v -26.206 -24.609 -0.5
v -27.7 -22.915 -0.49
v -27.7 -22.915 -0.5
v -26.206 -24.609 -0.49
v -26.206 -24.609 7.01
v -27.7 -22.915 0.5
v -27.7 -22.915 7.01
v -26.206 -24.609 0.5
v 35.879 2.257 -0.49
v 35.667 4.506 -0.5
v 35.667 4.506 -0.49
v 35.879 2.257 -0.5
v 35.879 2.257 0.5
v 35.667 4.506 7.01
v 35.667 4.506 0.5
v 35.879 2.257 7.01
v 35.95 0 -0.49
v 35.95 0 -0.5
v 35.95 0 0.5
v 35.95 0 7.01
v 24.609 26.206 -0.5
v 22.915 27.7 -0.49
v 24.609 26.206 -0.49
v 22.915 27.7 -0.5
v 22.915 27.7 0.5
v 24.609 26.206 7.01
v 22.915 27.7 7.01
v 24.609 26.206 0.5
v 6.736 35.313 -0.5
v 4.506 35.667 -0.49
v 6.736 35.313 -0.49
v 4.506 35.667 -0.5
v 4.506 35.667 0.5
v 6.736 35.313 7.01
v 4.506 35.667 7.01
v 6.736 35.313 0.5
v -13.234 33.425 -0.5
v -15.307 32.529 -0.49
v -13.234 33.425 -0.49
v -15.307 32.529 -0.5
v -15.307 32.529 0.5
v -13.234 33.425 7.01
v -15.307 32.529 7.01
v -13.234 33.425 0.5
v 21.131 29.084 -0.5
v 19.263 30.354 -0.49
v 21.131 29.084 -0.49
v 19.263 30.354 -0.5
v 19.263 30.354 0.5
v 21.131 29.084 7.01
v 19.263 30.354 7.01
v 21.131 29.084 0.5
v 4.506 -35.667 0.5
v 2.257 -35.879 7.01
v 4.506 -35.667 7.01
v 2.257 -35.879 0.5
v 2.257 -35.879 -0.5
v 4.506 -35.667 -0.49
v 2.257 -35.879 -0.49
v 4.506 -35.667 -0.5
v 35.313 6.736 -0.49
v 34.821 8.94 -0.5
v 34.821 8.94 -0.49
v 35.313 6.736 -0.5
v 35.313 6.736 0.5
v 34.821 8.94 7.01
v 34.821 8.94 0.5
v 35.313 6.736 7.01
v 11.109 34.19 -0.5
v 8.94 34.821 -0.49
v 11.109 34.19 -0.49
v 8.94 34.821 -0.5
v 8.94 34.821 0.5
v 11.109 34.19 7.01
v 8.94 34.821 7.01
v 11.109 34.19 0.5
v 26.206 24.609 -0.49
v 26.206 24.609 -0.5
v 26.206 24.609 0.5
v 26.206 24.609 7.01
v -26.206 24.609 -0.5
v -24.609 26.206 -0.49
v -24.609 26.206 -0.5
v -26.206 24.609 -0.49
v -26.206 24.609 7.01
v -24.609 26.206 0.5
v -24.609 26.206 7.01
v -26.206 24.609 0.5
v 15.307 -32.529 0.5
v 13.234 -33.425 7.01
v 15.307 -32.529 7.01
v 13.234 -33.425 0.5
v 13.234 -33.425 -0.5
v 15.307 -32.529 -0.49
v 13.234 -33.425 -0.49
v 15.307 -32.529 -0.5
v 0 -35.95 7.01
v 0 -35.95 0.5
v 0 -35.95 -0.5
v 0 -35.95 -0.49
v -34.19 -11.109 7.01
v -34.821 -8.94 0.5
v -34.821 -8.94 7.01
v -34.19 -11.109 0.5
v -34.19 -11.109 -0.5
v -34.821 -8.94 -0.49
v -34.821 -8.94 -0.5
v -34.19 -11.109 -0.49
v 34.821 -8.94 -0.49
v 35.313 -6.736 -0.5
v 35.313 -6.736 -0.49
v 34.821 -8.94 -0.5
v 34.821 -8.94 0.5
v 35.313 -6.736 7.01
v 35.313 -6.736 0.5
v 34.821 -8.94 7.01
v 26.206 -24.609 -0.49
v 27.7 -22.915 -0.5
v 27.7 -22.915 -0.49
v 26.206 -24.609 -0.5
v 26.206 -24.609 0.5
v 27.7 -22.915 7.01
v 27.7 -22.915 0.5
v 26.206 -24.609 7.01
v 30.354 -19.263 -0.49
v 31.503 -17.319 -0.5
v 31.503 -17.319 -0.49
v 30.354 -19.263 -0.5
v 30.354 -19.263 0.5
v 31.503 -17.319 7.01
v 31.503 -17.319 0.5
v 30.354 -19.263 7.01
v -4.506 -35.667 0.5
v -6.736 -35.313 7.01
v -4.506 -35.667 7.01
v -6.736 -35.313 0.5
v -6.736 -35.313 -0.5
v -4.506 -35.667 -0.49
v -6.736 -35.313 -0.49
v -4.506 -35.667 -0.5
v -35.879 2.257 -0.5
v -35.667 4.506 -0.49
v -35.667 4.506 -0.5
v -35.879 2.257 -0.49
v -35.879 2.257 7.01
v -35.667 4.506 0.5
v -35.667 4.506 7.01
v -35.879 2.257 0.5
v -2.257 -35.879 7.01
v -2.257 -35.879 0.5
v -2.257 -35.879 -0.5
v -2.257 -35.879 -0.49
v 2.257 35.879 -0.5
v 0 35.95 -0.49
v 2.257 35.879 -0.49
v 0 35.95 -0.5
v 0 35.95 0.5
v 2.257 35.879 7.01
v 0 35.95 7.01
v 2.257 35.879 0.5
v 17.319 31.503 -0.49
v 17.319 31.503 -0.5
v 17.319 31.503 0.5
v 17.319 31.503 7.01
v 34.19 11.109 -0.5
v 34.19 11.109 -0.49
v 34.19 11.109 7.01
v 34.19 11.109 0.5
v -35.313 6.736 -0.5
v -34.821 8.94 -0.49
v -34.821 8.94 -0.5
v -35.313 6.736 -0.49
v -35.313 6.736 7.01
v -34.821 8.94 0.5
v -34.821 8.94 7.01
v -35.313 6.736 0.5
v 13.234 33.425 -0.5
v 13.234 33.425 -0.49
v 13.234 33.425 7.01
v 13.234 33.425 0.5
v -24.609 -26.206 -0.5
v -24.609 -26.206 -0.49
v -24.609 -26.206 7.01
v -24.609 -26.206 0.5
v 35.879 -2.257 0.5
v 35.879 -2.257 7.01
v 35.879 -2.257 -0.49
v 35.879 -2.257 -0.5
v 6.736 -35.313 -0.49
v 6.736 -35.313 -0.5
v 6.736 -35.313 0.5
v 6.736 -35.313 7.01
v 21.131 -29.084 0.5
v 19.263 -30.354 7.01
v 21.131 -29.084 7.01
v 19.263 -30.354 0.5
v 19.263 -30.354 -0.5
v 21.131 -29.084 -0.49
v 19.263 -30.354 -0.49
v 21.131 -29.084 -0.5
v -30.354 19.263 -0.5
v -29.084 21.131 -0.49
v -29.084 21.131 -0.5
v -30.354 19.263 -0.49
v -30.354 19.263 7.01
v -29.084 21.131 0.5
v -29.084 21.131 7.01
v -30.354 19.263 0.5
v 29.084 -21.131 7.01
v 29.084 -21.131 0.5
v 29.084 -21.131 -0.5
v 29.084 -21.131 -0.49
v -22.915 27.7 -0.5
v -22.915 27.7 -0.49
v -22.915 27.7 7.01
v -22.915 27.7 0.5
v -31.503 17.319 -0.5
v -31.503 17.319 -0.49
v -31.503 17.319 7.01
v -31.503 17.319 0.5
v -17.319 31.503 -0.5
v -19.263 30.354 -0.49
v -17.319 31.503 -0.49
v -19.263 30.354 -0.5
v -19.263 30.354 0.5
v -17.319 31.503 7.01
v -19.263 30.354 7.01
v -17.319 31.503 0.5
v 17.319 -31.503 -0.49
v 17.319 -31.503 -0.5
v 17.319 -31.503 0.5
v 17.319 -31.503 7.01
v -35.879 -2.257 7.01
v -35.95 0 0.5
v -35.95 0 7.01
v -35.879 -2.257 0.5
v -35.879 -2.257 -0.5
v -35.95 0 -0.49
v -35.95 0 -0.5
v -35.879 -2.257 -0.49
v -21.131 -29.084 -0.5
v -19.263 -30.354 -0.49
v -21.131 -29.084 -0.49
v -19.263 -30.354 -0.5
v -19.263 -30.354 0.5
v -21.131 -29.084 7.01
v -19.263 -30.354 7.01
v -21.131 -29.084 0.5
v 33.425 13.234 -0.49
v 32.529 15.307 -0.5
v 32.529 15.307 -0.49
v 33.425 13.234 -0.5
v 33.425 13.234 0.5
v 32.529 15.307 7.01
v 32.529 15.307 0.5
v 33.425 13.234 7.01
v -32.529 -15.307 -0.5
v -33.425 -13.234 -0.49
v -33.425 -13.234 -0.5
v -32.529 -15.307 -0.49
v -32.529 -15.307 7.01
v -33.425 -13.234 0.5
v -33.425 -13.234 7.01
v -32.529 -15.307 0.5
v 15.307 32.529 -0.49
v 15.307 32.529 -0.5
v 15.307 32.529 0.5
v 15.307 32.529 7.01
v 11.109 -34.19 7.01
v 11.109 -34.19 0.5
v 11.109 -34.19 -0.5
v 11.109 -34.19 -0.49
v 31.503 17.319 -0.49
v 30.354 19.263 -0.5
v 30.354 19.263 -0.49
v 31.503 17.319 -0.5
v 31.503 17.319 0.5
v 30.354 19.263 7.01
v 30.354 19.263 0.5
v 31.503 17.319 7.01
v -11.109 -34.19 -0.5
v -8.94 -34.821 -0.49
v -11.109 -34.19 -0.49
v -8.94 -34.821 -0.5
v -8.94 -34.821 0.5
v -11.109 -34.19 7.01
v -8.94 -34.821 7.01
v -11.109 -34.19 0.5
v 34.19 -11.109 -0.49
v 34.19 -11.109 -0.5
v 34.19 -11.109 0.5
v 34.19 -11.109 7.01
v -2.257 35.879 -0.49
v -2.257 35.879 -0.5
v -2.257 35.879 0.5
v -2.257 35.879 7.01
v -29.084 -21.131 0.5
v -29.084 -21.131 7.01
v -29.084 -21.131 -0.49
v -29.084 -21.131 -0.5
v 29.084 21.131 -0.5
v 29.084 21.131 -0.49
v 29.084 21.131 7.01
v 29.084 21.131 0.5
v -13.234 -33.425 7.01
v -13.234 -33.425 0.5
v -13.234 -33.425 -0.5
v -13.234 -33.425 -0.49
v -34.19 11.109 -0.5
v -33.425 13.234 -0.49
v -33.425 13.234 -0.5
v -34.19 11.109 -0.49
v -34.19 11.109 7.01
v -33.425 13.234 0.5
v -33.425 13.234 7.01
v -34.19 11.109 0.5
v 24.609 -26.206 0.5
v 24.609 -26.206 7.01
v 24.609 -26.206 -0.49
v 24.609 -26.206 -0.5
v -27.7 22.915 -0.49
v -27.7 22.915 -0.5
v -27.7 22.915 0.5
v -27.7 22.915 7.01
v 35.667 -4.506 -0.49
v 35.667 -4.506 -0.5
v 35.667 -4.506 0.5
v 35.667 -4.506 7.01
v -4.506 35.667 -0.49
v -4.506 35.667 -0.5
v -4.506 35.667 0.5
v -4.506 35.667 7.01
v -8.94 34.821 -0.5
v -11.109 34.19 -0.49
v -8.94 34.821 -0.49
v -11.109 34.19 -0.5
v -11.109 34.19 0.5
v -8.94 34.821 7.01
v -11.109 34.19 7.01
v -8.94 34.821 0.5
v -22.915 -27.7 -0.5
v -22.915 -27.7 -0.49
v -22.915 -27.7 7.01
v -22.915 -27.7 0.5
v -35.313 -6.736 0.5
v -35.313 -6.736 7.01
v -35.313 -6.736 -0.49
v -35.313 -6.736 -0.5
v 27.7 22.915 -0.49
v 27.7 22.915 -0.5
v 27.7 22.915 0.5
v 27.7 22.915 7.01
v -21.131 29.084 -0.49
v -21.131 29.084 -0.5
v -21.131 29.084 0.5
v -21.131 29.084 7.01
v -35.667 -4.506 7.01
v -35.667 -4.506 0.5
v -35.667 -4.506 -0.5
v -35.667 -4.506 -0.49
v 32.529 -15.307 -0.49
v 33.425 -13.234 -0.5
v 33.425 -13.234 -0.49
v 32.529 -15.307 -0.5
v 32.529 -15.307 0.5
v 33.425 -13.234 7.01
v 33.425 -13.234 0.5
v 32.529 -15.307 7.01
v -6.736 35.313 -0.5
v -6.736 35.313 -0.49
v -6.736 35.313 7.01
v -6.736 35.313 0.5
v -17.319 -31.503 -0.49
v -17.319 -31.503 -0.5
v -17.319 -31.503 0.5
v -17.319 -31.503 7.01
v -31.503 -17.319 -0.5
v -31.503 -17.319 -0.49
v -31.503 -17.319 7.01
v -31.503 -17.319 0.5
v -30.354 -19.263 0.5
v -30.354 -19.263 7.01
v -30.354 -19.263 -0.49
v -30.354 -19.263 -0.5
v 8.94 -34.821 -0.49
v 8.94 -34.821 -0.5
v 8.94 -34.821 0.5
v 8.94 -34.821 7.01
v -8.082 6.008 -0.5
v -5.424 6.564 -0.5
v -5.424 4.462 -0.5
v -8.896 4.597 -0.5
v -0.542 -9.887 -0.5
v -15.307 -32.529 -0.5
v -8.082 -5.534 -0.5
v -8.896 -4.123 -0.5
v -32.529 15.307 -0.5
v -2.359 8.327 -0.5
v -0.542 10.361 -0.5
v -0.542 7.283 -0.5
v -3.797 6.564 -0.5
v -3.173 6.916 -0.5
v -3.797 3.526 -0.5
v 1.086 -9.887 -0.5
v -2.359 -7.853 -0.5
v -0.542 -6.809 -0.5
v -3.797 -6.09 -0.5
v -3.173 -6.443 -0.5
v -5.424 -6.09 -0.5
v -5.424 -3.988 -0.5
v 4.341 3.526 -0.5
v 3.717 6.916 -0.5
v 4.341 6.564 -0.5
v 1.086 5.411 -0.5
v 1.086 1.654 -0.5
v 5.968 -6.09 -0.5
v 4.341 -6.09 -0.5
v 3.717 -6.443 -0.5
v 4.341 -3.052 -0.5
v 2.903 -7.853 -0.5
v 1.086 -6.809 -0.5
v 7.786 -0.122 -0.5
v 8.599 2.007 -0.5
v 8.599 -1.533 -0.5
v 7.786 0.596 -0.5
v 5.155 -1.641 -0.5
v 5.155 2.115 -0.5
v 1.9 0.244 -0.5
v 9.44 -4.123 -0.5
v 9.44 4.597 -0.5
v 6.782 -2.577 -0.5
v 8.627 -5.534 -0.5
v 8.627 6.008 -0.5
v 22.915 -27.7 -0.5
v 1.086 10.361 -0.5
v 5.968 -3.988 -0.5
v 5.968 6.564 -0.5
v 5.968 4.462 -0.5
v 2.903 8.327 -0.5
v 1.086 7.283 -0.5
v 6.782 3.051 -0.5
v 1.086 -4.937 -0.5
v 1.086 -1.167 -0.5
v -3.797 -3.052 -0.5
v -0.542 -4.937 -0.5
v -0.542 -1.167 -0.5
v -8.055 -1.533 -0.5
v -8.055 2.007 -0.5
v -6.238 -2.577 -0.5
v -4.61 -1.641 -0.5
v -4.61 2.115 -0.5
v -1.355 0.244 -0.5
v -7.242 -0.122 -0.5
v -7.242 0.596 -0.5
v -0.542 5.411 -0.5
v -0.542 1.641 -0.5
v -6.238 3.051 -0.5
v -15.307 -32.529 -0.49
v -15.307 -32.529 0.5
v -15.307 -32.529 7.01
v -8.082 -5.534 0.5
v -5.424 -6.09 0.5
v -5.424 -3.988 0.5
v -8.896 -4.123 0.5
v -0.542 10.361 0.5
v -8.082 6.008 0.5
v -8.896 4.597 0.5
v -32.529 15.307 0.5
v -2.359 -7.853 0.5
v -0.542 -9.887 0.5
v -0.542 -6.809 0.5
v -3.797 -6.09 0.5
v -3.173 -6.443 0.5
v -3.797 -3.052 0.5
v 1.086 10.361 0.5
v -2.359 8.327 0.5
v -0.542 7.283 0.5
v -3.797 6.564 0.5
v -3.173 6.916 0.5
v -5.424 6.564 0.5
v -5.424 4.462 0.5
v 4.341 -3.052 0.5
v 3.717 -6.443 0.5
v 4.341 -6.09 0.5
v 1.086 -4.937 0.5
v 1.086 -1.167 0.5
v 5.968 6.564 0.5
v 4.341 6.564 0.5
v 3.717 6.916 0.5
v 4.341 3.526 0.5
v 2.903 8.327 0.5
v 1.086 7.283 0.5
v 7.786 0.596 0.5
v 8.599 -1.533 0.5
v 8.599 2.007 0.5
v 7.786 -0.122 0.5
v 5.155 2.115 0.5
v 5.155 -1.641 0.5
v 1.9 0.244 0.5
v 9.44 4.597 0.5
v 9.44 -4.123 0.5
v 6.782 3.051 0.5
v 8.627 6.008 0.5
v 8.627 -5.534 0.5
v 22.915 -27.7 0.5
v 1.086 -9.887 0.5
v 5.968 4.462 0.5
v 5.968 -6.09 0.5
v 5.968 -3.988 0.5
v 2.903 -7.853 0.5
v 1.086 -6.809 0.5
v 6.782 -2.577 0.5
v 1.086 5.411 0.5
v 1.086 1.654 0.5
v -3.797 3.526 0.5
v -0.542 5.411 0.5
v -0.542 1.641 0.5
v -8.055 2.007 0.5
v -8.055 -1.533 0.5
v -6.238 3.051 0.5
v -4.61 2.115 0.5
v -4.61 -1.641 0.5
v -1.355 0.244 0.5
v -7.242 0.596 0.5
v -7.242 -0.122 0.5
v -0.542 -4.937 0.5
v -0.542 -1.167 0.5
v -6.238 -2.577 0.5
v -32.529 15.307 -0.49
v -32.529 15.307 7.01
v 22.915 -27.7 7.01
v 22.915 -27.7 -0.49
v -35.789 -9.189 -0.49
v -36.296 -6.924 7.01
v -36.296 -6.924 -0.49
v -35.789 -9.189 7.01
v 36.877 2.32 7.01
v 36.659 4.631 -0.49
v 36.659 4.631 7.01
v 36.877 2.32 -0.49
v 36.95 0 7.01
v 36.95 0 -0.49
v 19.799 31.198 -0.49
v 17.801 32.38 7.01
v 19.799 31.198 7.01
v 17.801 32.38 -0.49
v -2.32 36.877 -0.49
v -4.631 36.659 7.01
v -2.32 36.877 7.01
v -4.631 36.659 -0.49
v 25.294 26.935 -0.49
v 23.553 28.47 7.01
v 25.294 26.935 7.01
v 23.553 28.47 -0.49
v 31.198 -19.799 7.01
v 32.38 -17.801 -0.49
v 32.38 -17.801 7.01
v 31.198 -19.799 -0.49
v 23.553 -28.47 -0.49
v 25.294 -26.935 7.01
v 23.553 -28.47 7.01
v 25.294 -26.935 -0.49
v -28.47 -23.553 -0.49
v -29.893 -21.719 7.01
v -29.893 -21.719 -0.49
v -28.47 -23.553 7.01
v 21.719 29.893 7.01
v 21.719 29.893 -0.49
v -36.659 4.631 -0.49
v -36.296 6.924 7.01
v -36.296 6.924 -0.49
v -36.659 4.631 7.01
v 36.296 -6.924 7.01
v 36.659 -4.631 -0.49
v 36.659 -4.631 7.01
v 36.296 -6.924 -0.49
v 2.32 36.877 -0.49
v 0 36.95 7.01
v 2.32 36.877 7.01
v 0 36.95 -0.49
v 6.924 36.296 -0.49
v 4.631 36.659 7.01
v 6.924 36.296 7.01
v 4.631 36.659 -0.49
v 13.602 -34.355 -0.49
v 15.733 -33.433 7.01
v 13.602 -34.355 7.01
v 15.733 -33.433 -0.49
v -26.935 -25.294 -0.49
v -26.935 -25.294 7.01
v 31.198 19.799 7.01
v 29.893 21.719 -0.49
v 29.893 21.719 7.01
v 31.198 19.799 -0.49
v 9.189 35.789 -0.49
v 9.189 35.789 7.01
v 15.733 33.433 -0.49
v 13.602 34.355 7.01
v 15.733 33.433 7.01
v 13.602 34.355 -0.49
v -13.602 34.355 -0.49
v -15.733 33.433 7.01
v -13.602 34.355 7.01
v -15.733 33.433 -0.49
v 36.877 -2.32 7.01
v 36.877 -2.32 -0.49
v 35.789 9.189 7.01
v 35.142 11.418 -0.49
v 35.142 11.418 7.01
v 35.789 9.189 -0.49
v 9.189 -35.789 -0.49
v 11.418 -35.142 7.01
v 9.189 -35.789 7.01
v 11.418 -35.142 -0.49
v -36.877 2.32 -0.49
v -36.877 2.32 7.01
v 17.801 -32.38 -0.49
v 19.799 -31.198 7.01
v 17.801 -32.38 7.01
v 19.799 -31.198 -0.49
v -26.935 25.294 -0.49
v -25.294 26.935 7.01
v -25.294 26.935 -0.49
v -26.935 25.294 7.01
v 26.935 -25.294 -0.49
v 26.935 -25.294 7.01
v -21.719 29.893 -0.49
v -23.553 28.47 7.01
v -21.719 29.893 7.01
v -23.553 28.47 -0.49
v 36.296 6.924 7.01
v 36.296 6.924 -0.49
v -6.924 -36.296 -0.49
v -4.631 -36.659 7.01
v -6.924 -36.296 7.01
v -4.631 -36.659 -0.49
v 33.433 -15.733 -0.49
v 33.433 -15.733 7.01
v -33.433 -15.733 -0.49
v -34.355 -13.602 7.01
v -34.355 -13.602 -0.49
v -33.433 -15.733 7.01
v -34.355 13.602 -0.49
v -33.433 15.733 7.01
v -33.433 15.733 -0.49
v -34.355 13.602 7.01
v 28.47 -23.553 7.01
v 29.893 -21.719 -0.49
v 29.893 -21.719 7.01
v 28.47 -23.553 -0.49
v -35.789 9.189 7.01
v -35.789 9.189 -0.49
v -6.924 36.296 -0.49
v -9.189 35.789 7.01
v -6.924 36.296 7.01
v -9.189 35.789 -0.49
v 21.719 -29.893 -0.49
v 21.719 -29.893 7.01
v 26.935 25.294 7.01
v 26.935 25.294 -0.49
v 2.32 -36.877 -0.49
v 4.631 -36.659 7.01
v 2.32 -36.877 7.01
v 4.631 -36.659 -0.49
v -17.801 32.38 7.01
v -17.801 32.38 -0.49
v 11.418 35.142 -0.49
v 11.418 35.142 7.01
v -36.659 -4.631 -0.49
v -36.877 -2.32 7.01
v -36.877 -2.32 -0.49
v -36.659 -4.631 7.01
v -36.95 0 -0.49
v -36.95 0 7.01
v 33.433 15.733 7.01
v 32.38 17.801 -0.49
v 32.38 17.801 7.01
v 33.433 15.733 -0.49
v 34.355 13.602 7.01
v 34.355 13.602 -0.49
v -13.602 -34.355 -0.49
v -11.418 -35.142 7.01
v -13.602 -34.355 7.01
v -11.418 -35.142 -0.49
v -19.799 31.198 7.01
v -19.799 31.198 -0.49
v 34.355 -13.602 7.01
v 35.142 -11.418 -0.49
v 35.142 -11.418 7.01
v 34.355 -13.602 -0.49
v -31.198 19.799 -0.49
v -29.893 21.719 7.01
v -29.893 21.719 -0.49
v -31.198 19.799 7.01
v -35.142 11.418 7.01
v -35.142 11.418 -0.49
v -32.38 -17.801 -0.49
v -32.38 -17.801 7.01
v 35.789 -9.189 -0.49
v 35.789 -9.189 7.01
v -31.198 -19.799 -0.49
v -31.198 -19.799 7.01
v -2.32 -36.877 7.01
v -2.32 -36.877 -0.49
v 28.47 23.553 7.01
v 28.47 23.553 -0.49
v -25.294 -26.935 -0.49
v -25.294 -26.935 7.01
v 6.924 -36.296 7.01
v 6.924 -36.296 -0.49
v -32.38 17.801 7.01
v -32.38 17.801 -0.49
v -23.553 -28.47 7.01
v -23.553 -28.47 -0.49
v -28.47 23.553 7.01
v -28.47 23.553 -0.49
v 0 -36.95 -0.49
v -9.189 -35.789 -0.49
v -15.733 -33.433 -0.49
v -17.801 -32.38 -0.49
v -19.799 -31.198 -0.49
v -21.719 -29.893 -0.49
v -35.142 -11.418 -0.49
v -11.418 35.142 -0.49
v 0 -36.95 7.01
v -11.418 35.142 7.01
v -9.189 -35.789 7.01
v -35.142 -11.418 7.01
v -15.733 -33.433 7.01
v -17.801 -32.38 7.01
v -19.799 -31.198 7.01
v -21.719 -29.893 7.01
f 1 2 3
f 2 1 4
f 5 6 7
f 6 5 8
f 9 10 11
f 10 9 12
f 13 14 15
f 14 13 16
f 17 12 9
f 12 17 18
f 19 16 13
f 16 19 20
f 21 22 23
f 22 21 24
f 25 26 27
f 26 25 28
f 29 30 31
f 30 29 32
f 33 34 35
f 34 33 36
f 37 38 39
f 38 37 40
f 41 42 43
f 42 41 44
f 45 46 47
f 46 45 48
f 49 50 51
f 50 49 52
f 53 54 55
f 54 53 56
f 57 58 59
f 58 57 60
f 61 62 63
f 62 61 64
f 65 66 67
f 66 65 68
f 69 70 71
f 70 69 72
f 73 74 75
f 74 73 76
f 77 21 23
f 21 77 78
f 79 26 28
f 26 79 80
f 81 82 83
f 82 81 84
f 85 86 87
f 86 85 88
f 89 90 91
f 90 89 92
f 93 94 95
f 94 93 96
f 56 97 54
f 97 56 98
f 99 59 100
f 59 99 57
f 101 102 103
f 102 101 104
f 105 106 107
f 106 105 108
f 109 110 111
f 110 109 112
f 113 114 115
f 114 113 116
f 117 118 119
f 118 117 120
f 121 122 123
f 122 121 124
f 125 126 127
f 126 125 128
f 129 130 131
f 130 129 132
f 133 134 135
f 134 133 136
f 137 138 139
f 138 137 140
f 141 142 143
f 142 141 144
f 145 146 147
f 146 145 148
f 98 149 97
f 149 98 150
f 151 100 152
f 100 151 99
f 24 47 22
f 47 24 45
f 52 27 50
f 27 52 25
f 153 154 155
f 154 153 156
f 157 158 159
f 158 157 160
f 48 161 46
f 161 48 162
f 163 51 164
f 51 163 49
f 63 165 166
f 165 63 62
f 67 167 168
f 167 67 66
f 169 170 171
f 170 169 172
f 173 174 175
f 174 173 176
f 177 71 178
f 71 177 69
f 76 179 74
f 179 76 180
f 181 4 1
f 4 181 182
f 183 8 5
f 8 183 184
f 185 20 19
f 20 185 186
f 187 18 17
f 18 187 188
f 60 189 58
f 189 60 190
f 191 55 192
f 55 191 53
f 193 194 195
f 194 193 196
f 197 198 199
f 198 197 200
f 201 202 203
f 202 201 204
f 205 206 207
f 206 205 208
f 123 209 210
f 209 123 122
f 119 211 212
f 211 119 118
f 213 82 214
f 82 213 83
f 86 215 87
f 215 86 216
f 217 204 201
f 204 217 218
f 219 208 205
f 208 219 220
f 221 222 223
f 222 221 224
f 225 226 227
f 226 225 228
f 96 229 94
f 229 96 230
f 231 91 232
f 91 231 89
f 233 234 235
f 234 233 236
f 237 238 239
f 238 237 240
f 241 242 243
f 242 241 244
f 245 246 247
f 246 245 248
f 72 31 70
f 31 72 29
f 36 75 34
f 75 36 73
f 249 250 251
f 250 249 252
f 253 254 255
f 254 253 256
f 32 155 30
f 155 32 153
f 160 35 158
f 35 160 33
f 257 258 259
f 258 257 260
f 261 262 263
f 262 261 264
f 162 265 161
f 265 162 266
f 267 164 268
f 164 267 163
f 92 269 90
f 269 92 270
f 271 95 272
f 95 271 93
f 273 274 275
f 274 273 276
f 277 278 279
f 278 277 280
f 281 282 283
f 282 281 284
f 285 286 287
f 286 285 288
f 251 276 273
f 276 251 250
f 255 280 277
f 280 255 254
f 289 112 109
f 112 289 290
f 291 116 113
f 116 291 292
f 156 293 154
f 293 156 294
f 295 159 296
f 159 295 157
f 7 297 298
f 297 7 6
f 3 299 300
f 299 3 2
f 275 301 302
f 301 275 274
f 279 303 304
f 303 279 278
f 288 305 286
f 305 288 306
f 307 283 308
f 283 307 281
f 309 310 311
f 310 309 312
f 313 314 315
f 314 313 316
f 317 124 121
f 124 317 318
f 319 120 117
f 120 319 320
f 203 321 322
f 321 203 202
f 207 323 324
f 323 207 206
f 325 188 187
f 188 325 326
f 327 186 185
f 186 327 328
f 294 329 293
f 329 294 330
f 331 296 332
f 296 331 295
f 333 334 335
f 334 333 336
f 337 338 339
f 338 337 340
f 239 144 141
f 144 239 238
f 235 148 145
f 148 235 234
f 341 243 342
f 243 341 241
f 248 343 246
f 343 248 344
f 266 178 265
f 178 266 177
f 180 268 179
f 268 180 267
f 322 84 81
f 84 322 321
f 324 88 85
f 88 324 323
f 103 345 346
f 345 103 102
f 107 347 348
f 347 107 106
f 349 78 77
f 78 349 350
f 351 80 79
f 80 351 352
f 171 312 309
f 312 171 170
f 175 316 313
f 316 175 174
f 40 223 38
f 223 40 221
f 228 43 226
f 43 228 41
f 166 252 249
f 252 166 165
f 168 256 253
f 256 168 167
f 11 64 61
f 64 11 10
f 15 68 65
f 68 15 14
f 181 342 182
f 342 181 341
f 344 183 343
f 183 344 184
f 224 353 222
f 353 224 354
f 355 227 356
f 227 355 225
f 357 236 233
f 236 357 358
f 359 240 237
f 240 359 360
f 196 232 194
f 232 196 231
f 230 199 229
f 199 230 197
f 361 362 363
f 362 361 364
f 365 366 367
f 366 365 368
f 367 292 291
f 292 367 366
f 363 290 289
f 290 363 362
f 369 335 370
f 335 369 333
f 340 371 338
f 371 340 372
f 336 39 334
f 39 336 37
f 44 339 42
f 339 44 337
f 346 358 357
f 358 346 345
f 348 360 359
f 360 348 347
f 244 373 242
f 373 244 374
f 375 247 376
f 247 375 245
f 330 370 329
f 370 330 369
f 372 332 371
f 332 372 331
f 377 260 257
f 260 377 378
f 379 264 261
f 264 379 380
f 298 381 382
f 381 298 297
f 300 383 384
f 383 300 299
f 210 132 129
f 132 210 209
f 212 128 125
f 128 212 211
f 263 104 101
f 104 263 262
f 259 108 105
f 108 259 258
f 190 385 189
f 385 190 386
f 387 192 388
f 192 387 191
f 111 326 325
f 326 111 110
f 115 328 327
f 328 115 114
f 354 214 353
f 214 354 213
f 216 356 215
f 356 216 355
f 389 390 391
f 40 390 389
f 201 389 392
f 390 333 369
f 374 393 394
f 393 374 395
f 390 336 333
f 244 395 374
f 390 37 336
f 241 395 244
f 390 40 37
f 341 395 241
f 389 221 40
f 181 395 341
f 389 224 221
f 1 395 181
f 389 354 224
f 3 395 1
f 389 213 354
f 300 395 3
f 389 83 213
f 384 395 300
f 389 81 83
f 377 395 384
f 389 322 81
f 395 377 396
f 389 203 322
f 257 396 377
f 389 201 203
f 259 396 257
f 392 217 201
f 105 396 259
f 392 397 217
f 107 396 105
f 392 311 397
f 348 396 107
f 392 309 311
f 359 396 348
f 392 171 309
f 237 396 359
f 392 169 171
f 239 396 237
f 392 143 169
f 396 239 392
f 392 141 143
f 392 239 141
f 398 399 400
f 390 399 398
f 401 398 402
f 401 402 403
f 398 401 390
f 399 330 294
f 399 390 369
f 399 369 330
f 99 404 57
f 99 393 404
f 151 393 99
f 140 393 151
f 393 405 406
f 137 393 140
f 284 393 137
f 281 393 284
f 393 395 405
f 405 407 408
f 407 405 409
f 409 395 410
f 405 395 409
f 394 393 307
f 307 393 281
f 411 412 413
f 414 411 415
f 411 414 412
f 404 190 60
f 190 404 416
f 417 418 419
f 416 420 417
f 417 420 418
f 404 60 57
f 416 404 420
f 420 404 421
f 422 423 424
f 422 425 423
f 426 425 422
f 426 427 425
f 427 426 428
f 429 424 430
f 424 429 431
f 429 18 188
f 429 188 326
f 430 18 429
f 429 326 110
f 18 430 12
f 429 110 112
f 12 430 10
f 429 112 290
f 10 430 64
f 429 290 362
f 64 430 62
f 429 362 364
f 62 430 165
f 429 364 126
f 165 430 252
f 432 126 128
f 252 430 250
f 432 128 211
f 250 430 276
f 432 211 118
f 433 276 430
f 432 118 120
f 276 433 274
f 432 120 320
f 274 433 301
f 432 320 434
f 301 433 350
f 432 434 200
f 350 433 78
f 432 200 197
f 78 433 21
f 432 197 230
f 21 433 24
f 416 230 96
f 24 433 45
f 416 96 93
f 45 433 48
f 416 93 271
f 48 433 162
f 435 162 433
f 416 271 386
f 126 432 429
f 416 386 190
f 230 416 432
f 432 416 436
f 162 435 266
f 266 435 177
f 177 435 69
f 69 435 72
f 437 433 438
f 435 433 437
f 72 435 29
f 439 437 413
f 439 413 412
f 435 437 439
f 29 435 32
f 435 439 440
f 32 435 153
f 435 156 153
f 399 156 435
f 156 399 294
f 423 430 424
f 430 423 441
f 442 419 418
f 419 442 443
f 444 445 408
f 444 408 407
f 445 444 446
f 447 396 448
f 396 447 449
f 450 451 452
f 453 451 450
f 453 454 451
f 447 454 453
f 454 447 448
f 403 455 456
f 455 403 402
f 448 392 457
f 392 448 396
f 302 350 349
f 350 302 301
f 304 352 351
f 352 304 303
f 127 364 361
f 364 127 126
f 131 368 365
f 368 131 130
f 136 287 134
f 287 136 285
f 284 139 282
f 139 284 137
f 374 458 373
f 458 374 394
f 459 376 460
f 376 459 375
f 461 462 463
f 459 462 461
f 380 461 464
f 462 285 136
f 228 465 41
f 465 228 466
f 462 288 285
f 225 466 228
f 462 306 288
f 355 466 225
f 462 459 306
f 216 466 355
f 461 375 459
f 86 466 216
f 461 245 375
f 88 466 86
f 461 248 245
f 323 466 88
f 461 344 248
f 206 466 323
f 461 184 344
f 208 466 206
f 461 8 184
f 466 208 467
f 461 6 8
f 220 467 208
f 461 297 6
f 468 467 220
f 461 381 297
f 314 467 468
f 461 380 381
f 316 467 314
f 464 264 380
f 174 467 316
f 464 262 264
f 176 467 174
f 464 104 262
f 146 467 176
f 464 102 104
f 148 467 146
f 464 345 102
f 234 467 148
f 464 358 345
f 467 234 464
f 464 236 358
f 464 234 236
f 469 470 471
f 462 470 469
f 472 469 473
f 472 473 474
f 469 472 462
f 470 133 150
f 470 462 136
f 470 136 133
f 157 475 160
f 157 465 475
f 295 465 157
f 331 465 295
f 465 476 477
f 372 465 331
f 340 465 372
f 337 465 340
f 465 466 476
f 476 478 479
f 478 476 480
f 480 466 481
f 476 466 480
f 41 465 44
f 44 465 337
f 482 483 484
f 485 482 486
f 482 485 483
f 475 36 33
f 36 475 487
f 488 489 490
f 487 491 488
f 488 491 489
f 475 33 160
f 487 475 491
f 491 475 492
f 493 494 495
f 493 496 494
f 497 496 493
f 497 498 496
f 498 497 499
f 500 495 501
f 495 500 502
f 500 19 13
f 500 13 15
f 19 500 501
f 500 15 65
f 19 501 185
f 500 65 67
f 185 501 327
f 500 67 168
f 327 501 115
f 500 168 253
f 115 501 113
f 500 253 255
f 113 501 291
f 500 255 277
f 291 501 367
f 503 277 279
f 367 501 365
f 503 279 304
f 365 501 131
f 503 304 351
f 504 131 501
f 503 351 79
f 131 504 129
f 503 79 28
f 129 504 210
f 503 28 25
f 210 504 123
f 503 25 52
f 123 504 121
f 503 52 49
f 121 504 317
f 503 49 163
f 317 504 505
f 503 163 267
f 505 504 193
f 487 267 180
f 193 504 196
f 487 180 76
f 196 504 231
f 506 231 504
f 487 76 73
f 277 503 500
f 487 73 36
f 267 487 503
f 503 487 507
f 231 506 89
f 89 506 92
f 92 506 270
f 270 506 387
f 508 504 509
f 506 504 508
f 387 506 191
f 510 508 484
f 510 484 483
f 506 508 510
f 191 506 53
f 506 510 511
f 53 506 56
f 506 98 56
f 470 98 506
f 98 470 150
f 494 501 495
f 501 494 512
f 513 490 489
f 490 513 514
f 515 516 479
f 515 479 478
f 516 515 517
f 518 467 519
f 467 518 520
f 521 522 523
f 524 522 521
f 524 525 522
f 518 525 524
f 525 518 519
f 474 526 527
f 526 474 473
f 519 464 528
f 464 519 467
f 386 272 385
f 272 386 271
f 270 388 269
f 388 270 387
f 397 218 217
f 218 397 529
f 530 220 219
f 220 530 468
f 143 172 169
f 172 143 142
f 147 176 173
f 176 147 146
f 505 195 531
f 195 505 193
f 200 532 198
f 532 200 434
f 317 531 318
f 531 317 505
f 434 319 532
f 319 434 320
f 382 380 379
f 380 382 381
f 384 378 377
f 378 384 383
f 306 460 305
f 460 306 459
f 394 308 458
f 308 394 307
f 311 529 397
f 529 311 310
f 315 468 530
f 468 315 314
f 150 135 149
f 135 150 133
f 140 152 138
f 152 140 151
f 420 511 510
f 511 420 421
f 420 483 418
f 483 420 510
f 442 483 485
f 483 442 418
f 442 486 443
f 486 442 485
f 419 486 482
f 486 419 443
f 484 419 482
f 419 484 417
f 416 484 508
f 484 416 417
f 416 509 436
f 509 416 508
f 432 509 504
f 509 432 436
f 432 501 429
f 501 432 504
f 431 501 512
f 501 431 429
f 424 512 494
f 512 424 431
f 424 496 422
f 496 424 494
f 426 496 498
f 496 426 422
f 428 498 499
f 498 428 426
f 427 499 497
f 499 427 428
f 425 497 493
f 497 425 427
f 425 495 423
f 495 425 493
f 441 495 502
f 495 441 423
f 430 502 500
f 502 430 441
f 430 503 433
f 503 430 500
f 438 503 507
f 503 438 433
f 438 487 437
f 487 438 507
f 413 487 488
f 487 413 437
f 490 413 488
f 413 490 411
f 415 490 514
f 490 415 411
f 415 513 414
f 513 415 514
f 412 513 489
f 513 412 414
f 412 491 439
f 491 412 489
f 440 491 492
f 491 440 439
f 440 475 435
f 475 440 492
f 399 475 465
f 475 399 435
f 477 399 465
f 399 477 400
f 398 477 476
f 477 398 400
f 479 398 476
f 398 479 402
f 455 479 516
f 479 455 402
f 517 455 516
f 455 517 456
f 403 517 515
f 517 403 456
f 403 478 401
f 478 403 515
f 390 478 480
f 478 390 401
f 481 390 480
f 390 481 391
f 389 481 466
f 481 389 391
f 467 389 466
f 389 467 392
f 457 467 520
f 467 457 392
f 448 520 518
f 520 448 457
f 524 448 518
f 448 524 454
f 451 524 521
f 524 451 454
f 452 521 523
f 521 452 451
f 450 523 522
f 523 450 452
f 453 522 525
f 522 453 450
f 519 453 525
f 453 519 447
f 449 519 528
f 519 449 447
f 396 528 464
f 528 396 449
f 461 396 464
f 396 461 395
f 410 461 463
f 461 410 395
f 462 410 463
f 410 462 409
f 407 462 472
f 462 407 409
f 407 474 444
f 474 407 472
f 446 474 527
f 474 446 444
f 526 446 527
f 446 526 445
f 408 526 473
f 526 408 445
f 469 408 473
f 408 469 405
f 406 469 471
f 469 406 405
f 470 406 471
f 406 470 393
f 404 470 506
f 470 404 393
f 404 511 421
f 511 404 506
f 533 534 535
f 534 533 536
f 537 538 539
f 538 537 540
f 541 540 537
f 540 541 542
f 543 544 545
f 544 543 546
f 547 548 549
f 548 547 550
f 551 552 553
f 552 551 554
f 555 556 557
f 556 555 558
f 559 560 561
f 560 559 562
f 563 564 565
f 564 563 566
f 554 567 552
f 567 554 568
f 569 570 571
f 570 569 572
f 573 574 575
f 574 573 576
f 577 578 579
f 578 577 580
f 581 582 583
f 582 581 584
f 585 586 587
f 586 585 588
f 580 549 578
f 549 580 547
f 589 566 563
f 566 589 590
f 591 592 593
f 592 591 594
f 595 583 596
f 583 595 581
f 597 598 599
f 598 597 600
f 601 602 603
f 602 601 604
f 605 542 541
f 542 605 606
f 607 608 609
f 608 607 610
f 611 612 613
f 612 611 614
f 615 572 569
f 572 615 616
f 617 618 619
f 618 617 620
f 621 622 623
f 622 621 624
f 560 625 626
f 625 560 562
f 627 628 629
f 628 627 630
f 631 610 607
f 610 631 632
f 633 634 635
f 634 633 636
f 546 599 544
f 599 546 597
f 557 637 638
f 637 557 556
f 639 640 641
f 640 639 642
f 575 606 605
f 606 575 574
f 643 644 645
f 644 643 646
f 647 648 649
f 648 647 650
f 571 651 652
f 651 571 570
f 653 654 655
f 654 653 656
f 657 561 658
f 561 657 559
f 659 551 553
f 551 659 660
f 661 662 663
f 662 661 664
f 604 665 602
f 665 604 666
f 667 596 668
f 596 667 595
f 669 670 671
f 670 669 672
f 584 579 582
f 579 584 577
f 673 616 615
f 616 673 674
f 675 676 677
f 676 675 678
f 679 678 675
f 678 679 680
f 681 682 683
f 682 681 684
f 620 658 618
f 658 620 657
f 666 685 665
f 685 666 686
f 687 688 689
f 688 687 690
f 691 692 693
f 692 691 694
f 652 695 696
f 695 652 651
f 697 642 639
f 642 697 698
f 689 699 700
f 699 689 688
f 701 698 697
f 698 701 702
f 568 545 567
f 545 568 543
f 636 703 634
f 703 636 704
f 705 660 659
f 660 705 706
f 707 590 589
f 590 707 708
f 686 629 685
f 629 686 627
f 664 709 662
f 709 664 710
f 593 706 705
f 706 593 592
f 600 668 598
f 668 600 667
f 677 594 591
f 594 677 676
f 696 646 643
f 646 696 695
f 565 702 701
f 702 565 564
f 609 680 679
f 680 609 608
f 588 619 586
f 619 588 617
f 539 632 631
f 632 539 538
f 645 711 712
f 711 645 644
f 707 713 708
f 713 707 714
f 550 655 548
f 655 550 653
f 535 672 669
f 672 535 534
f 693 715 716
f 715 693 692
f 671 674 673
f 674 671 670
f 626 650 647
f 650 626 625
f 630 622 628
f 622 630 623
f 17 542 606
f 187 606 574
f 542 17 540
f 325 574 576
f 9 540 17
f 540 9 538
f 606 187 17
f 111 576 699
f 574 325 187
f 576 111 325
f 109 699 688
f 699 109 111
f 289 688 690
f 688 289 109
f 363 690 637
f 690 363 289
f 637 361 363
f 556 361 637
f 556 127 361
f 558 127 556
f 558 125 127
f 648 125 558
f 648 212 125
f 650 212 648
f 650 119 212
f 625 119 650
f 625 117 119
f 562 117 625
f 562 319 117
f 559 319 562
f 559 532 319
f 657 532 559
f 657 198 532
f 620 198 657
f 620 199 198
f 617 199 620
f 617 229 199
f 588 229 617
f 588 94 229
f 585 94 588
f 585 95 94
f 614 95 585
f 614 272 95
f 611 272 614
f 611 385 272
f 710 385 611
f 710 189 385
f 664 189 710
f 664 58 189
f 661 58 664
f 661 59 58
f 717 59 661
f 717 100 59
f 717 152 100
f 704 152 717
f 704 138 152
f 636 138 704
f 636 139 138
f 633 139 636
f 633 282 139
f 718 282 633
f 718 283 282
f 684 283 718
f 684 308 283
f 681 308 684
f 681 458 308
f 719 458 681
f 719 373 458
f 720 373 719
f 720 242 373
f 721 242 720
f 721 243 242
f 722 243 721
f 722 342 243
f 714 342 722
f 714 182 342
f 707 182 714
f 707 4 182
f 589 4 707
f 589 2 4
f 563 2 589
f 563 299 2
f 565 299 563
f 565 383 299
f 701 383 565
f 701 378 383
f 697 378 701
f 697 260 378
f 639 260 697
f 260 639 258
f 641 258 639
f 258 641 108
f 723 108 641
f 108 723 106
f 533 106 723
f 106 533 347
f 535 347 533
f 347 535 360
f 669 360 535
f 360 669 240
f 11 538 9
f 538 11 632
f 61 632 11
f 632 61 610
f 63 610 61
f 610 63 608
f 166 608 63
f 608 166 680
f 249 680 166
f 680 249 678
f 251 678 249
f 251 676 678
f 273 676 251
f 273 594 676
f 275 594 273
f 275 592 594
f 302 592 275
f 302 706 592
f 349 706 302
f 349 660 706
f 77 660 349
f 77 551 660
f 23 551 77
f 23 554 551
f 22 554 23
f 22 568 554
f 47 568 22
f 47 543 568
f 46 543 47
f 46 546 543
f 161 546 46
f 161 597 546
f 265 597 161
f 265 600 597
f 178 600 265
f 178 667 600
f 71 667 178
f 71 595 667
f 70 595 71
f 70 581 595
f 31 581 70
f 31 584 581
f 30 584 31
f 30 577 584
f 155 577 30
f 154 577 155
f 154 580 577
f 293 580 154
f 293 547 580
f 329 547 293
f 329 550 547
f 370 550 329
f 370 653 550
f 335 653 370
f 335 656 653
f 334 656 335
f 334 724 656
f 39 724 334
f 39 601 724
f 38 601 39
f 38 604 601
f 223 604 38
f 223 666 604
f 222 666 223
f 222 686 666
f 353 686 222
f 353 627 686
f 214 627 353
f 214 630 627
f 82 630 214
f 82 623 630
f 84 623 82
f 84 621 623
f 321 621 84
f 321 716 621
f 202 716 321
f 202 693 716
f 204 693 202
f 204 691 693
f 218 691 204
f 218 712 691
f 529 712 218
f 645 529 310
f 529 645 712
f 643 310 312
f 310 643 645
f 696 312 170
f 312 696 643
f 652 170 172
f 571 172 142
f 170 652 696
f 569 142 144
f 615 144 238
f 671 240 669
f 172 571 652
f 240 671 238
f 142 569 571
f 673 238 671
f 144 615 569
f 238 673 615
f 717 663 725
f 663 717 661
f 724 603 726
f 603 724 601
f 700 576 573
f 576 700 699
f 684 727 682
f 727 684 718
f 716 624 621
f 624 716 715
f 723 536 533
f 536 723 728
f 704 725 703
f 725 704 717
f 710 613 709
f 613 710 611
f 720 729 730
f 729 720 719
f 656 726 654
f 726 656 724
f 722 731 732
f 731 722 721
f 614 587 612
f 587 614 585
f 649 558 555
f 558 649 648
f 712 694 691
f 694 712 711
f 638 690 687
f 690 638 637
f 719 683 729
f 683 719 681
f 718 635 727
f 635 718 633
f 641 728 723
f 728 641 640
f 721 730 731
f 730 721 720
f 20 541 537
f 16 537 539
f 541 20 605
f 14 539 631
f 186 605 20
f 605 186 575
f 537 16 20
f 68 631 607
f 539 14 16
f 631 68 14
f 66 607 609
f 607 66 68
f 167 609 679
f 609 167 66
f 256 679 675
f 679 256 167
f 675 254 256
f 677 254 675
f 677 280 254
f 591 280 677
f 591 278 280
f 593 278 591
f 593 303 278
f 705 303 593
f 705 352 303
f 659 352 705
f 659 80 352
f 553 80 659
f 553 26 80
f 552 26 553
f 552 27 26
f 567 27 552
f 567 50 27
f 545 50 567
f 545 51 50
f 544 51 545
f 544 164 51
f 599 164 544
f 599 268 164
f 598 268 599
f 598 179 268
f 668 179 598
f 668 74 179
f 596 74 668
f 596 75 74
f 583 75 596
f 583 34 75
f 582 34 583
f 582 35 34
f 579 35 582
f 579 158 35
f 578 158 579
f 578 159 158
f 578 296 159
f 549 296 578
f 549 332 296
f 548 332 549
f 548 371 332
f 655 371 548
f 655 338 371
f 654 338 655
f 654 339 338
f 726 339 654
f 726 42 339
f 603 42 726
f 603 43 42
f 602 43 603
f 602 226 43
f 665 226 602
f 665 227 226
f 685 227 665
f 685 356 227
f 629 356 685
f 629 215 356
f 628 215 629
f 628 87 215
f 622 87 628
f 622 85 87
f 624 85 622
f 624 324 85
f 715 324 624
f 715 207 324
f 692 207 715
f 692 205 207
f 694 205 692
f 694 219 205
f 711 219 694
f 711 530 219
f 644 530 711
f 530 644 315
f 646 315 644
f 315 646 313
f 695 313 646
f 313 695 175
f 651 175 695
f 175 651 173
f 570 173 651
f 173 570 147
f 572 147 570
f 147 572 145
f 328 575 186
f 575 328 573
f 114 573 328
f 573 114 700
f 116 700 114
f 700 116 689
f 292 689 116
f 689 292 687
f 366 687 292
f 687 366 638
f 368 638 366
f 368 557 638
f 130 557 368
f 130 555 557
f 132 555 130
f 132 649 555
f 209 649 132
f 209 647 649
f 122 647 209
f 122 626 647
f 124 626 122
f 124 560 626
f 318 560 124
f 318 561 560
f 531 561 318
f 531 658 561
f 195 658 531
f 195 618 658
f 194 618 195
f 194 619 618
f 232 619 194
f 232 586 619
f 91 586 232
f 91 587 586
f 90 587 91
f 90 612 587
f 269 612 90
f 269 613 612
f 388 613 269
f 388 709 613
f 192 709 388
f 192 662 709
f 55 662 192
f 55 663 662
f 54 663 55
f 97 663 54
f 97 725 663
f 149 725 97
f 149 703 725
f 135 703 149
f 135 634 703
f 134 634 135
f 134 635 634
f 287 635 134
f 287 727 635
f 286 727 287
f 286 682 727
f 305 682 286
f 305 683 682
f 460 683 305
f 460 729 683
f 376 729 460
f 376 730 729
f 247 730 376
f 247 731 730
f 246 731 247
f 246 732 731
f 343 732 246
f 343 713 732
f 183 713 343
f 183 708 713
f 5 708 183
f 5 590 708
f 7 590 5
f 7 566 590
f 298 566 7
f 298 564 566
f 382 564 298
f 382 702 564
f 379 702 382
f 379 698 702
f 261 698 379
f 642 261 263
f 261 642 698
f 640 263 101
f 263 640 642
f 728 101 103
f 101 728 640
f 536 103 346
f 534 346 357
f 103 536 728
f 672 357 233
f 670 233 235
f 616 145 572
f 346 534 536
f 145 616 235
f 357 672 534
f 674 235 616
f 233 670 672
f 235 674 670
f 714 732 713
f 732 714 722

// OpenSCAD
$fn=100;

thickness=1;
wall_thickness=1;
wall_height=7.5;
diameter=72 - 0.1;

snowflake= "\u2744";
heart    = "\u2764";
tree     = "\U01F384";
star     = "\u2736";
cstar    = "\u2742";

pattern=snowflake;
tfont="DejaVu Sans";
//tfont="Android Emoji:style=Regular";
font_size=20;


radius=diameter/2;

difference() {
    cylinder(r=radius, h=thickness, center=true);

    linear_extrude(height=thickness*2, center=true)
    text(text=pattern, size=font_size, halign="center", valign="center", font=tfont);
}

translate([0,0,-(thickness/2 - wall_height/2 - 0.01)])
color("red")
difference() {
    cylinder(r=radius+wall_thickness, h=wall_height, center=true);
    cylinder(r=radius, h=wall_height*2, center=true);
}
